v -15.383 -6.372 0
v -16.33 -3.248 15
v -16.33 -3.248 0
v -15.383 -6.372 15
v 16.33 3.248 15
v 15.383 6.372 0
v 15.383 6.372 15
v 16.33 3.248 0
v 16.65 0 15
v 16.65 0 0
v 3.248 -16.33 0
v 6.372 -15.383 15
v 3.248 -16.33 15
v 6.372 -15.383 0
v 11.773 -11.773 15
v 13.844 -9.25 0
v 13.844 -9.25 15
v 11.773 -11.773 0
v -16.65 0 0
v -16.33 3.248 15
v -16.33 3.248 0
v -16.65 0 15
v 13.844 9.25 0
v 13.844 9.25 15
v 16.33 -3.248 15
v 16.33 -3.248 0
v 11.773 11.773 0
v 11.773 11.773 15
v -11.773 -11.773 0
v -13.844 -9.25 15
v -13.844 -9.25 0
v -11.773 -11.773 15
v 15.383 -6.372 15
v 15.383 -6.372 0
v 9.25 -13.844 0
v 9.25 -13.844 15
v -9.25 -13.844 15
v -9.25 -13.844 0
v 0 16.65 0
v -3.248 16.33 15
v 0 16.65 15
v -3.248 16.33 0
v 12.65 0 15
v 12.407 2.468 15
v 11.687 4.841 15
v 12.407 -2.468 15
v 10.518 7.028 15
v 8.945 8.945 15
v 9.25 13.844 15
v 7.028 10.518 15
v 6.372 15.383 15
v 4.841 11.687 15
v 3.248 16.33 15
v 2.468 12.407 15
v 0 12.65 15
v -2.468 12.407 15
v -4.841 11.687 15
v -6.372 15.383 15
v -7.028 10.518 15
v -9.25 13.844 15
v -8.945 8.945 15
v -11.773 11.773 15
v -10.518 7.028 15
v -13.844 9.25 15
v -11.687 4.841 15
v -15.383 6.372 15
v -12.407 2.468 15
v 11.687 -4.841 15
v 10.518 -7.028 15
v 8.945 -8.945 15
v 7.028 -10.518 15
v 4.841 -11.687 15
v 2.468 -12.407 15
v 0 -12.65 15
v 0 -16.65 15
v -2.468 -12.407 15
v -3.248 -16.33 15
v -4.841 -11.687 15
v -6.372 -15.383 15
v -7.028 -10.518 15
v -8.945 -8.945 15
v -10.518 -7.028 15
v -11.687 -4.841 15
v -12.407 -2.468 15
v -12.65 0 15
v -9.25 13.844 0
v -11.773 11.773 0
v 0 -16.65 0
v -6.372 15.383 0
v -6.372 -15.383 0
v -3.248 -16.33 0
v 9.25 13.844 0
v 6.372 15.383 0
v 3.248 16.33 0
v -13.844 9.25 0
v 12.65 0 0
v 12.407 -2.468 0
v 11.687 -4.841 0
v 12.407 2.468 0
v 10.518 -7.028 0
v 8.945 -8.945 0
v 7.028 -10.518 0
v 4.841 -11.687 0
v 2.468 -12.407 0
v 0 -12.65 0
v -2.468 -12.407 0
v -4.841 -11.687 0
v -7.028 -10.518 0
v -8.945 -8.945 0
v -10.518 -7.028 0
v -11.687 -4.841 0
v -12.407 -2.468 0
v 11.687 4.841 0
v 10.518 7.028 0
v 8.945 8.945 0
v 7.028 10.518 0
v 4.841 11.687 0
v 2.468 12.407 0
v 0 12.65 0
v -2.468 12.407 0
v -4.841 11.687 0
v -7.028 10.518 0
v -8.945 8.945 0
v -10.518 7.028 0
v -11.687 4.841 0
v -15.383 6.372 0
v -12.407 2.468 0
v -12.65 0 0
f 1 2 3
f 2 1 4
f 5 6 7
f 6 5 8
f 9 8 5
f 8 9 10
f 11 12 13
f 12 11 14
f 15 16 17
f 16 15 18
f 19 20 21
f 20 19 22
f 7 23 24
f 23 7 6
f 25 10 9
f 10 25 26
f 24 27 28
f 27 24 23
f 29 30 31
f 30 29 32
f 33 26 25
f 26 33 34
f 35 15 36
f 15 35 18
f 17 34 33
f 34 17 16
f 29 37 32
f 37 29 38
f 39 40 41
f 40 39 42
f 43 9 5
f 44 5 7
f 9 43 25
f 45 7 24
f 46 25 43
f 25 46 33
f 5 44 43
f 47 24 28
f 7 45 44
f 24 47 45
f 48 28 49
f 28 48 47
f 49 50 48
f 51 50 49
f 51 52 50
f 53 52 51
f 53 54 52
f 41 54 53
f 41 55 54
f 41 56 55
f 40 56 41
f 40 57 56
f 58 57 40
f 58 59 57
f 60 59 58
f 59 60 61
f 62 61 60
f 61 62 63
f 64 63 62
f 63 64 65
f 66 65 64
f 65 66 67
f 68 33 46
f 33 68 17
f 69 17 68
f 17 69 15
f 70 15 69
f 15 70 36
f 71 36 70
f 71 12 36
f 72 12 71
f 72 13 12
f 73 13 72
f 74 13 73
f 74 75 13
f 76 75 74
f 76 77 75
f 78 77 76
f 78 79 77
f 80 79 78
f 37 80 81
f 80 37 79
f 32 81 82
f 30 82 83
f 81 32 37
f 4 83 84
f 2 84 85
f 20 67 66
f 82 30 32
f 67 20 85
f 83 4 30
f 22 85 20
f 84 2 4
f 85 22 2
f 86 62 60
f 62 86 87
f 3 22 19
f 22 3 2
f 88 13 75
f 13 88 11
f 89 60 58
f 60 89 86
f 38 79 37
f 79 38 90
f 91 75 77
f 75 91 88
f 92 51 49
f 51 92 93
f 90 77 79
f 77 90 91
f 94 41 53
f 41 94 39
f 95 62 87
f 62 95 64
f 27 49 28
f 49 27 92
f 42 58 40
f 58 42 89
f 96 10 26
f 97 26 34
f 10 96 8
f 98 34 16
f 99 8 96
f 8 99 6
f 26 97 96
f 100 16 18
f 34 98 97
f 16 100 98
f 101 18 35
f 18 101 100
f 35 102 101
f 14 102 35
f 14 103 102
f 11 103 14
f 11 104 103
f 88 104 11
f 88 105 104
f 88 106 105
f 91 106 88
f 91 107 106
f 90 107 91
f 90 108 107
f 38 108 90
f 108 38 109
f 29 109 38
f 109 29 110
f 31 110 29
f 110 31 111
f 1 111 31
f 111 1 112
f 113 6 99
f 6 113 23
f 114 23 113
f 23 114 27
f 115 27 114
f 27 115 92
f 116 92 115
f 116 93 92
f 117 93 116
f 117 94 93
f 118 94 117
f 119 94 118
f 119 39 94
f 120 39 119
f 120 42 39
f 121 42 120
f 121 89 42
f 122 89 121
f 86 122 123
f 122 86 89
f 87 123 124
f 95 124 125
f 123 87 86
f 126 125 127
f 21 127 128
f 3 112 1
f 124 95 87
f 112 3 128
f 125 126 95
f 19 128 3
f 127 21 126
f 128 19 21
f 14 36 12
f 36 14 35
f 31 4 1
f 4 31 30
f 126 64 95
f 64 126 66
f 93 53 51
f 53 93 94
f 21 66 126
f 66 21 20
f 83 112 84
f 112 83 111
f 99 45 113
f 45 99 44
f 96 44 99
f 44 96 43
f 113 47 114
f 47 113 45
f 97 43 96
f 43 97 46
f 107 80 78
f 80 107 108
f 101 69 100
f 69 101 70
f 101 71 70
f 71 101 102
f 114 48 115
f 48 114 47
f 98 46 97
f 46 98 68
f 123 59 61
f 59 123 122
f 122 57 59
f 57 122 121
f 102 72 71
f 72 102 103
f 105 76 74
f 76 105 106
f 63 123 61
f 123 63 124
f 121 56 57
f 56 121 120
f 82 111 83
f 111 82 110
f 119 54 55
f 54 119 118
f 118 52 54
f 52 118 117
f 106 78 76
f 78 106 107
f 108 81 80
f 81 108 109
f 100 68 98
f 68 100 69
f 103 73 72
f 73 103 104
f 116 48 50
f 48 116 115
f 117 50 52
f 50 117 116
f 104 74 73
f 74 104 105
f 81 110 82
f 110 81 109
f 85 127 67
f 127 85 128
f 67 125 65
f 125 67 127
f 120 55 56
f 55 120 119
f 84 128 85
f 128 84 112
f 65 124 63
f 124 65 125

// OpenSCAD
$fn = 32;

// ----------------------------------------------------------------------
// Spacer sleeve: 33.3 / 25.3 x 15 mm
// ----------------------------------------------------------------------

// --- parameters (mm) ---
tube_d = 33.3;            // outside diameter
bore_d = 25.3;            // shaft bore
tube_l = 15;              // sleeve length

module sleeve() {
  cylinder(h = tube_l, d = tube_d);
}

difference() {
  sleeve();
  translate([0, 0, -1]) cylinder(h = tube_l + 2, d = bore_d);
}
